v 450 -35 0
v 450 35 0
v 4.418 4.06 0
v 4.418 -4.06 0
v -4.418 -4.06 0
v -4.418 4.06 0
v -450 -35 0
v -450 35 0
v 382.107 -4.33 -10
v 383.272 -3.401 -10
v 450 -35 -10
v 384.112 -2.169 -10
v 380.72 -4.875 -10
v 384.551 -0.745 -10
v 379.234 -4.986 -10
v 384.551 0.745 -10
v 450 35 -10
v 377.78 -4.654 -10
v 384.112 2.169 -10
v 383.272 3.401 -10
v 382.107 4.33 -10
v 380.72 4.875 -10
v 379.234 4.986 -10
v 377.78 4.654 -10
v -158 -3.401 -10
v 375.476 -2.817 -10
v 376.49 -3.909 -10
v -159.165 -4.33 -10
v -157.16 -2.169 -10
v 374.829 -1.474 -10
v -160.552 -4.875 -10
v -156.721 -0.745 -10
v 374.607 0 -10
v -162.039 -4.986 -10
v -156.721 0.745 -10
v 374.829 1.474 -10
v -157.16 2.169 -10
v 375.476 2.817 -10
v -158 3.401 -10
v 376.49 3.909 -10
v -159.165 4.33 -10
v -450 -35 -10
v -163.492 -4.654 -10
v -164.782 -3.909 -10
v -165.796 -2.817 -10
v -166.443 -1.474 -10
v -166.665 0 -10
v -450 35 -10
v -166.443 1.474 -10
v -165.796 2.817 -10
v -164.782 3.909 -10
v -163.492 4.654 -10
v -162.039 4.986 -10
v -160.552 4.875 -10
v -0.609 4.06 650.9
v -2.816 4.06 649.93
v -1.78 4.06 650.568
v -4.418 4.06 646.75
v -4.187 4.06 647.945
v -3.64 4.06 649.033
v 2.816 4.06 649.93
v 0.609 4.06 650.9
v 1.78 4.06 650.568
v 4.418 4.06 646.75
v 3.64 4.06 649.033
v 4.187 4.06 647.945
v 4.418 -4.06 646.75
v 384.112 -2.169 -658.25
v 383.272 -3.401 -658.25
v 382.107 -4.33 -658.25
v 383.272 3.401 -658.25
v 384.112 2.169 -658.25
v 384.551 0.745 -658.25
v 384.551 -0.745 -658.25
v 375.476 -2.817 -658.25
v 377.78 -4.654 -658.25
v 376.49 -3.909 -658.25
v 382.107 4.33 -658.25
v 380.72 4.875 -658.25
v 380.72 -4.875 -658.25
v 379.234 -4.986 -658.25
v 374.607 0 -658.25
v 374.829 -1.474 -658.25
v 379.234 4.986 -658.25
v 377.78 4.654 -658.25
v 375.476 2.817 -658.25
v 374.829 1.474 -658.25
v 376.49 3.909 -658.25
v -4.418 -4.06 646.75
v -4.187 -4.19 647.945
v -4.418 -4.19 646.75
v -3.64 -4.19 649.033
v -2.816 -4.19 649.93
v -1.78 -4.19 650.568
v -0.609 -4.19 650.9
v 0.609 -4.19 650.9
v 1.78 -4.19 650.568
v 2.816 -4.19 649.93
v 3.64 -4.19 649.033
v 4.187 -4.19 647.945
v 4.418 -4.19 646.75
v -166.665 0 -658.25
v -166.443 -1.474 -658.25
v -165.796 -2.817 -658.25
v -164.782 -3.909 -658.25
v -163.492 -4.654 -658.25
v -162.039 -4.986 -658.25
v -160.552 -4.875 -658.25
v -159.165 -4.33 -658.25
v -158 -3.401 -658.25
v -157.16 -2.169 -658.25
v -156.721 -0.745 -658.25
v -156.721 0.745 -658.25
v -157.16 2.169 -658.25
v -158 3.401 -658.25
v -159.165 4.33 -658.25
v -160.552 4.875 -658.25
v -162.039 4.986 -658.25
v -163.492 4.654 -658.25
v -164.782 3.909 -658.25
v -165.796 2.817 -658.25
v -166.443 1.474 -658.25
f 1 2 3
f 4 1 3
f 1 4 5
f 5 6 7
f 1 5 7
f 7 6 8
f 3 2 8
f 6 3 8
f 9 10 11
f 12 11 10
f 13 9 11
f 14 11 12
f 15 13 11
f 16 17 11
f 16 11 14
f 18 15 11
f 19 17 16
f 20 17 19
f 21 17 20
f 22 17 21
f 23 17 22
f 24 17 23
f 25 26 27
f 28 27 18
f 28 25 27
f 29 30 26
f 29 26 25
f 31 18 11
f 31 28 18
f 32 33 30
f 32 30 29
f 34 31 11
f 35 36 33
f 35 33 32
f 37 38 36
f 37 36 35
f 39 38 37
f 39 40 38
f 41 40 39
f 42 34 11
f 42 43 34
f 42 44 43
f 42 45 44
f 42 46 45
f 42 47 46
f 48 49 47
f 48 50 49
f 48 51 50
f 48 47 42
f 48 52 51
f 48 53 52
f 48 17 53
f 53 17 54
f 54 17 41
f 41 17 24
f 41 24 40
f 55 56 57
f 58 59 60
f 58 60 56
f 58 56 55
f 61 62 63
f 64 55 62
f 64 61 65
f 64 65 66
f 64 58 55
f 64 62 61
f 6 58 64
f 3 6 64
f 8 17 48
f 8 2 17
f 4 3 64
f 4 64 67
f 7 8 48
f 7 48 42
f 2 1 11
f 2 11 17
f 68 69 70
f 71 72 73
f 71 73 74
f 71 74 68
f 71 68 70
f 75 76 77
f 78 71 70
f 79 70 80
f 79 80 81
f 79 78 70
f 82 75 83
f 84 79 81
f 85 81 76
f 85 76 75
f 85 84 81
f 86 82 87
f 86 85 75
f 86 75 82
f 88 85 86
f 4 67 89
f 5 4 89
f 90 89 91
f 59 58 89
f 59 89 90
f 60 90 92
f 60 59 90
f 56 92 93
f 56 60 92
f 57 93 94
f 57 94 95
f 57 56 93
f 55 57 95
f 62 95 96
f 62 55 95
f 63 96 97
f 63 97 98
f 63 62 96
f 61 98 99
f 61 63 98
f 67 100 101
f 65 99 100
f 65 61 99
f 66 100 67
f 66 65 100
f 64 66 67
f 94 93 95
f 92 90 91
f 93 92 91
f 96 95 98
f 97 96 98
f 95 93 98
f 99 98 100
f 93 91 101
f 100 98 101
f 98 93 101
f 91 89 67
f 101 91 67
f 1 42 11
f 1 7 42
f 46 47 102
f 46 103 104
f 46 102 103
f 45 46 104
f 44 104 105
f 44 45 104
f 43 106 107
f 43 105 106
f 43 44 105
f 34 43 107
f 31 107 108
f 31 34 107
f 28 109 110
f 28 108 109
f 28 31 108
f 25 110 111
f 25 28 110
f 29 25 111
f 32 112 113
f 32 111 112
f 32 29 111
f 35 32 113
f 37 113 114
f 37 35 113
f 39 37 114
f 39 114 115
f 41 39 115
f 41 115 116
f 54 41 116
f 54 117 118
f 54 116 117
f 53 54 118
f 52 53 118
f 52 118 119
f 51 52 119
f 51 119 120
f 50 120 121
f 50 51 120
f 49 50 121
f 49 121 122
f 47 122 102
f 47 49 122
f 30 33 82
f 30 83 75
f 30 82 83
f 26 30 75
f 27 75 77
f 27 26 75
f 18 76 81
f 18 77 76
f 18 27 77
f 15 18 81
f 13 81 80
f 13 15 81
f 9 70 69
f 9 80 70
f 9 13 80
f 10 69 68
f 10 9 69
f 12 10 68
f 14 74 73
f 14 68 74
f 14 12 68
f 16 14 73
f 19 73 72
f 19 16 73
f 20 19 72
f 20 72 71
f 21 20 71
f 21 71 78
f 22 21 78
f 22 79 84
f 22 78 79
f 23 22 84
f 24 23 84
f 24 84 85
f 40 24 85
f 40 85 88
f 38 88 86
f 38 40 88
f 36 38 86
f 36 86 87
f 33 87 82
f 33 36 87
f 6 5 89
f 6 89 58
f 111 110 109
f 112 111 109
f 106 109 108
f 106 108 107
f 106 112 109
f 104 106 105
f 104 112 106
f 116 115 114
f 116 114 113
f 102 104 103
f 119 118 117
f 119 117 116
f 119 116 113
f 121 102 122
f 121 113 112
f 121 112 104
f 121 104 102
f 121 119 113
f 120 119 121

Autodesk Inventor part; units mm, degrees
ref_plane "YZ Plane" through (0, 0, 0) normal (1, 0, 0) x (0, 1, 0)
ref_plane "XZ Plane" through (0, 0, 0) normal (0, 1, 0) x (-1, 0, 0)
sketch "Sketch1" plane through (0, 0, 0) normal (0, 0, 1) x (1, 0, 0)
  line L0 (4.4177, -4.0601) -> (-4.4177, -4.0601)
  line L1 (-4.4177, -4.0601) -> (-4.4177, 4.0601)
  line L2 (-4.4177, 4.0601) -> (4.4177, 4.0601)
  line L3 (4.4177, 4.0601) -> (4.4177, -4.0601)
  line L4 (4.4177, -4.0601) -> (-4.4177, 4.0601) construction
  line L5 (-4.4177, -4.0601) -> (4.4177, 4.0601) construction
  point P0 (0, 0)
extrude "Extrusion1" add sketch "Sketch1" along normal blind 650
fillet "Fillet2" radius 3.25 4 edges at (0, 4.0601, 650) (-4.4177, 0, 650) (0, -4.0601, 650) (4.4177, 0, 650)
ref_plane "Work Plane1" through (4.4177, 0, 646.75) normal (0, 1, 0) x (1, 0, 0)
sketch "Sketch2" plane through (4.4177, 0, 646.75) normal (0, 1, 0) x (1, 0, 0)
  line L0 (-8.8354, 0) -> (0, 0) projected
  arc A0 (-8.8354, 0) -> (0, 0) centre (-4.4177, 1.3775) ccw
  line L1 (-8.8354, 0) -> (-8.8354, -4.2008)
  line L2 (-8.8354, -4.2008) -> (-4.4177, -4.2008)
  line L3 (-4.4177, -4.2008) -> (-4.4177, -3.25)
  point P0 (-4.4177, 646.75)
extrude "Extrusion2" cut sketch "Sketch2" along normal mid plane 20 contours L0 A0
sketch "Sketch3" plane through (4.4177, 4.0601, 646.75) normal (0, 1, 0) x (1, 0, 0)
  line L0 (-9.2871, 0) -> (1.4537, 0)
  line L1 (1.4537, 0) -> (1.4537, -3.6122)
  line L2 (1.4537, -3.6122) -> (-9.2871, -3.6122)
  line L3 (-9.2871, -3.6122) -> (-9.2871, 0)
  point P0 (-4.4177, 646.75)
extrude "Extrusion3" cut sketch "Sketch3" against normal blind 25.5
sketch "Sketch4" plane through (4.4177, 4.0601, 646.75) normal (0, 1, 0) x (1, 0, 0)
  line L0 (-8.8354, 0) -> (0, 0) projected
  arc A0 (-8.8354, 0) -> (0, 0) centre (-4.4177, 0.2318) ccw
  point P0 (-4.4177, 646.75)
extrude "Extrusion4" add sketch "Sketch4" against normal blind 8.25
sketch "Sketch5" plane through (0, 0, 0) normal (0, 0, -1) x (-1, 0, 0)
  line L0 (-450, 35) -> (450, 35)
  line L1 (450, 35) -> (450, -35)
  line L2 (450, -35) -> (-450, -35)
  line L3 (-450, -35) -> (-450, 35)
  line L4 (-450, 35) -> (450, -35) construction
  line L5 (450, 35) -> (-450, -35) construction
  circle A0 centre (161.6649, 0) radius 5
  circle A1 centre (-379.6072, 0) radius 5
  point P0 (0, 0)
  dimension "d11" = 900
  dimension "d12" = 70
  dimension "d14" = 10
extrude "Extrusion5" add sketch "Sketch5" along normal blind 10
extrude "Extrusion6" add sketch "Sketch5" along normal blind 658.25 contours A0 | A1
